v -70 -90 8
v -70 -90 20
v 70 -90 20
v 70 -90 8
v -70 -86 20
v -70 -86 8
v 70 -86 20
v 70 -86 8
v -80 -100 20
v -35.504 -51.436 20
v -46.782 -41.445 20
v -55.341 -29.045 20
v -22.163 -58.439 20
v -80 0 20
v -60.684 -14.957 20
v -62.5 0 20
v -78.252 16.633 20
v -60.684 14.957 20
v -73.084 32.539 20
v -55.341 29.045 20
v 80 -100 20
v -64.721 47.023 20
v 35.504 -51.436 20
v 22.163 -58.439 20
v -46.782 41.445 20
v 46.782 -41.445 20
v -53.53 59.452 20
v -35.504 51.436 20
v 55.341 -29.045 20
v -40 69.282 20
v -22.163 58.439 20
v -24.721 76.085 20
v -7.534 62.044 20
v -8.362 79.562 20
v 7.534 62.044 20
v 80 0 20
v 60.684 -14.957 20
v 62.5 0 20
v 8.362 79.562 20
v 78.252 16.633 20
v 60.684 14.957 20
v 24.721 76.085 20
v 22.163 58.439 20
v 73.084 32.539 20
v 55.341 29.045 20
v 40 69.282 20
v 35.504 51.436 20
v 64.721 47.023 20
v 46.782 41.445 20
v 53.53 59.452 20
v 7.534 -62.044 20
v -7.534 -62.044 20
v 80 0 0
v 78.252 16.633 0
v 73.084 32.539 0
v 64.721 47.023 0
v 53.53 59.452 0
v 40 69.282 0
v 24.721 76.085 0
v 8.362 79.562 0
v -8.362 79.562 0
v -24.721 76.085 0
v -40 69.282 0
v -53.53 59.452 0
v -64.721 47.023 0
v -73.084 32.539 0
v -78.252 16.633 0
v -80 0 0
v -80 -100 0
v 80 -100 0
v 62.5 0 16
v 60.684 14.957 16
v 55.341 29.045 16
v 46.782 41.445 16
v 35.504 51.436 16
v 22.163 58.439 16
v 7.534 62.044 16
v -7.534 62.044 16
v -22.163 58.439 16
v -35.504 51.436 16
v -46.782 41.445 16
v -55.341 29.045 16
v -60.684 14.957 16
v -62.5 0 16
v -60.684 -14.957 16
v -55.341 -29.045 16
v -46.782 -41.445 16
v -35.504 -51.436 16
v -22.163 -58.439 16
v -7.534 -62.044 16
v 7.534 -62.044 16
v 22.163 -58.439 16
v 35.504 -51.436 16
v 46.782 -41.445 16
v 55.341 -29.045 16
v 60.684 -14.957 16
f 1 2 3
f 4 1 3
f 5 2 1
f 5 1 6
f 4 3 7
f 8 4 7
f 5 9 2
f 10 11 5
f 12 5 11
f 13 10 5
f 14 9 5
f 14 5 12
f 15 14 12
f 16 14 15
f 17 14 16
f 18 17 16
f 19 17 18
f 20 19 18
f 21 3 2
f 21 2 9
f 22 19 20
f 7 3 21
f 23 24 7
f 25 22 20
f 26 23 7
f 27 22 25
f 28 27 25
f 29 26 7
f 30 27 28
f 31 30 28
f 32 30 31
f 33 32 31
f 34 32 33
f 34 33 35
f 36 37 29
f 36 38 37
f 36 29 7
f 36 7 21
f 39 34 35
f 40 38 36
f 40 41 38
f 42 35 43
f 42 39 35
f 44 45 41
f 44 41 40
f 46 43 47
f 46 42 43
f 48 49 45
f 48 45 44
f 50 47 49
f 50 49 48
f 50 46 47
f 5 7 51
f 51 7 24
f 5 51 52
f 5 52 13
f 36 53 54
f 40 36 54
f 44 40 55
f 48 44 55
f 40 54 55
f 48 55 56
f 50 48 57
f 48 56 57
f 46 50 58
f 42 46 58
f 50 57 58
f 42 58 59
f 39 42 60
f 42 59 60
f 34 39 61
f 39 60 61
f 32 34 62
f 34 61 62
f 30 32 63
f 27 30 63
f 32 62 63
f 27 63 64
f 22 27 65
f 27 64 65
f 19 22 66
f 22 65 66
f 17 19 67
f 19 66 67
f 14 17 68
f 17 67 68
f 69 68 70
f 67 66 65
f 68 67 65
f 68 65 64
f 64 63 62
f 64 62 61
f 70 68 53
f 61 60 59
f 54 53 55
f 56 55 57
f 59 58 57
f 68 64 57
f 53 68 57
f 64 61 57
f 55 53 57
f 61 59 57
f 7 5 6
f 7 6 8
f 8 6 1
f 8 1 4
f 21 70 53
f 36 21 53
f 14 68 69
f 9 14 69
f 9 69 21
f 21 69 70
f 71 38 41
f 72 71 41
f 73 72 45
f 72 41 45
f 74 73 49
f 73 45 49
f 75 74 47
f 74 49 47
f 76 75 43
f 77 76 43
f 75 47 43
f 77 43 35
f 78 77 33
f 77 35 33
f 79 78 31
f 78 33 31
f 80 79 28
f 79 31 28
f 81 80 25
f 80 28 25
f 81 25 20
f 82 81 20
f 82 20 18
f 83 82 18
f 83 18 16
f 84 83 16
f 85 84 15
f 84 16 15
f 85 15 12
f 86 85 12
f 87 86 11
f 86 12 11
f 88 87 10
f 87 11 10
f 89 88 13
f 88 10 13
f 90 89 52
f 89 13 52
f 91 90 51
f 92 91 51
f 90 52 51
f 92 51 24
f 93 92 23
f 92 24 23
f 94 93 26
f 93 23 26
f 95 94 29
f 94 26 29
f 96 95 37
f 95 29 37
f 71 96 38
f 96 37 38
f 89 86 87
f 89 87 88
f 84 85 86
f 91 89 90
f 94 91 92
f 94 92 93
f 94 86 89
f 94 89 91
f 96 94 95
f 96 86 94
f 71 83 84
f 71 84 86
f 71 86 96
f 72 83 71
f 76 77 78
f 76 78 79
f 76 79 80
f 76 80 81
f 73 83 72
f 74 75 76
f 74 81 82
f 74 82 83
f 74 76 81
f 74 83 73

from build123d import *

# Parameters (mm, degrees)
F1_DEPTH = 20
F2_R     = 62.5
F3_DEPTH = 4
F4_W     = 140
F4_H     = 4
F5_DEPTH = 12


# Not quite as in the source:
# - a feature of the source that left no trace in its solid (it failed there, or was rolled back) is left out


with BuildPart() as f1:
    # F0 (on Top) → F1 (new body)
    with BuildSketch(Plane.XY):
        with BuildLine():
            Line((80, -100), (80, 0))
            ThreePointArc((80, 0), (0, 80), (-80, 0))
            Line((-80, 0), (-80, -100))
            Line((-80, -100), (80, -100))
        make_face()
    extrude(amount=F1_DEPTH)

    # F2 (on face) → F3 (cut)
    with BuildSketch(Plane.XY.offset(20)):
        Circle(F2_R)
    extrude(amount=-F3_DEPTH, mode=Mode.SUBTRACT)

    # F4 (on face) → F5 (cut)
    with BuildSketch(Plane.XY.offset(20)):
        with Locations((0, -88)):
            Rectangle(F4_W, F4_H)
    extrude(amount=-F5_DEPTH, mode=Mode.SUBTRACT)


solid = f1.part
